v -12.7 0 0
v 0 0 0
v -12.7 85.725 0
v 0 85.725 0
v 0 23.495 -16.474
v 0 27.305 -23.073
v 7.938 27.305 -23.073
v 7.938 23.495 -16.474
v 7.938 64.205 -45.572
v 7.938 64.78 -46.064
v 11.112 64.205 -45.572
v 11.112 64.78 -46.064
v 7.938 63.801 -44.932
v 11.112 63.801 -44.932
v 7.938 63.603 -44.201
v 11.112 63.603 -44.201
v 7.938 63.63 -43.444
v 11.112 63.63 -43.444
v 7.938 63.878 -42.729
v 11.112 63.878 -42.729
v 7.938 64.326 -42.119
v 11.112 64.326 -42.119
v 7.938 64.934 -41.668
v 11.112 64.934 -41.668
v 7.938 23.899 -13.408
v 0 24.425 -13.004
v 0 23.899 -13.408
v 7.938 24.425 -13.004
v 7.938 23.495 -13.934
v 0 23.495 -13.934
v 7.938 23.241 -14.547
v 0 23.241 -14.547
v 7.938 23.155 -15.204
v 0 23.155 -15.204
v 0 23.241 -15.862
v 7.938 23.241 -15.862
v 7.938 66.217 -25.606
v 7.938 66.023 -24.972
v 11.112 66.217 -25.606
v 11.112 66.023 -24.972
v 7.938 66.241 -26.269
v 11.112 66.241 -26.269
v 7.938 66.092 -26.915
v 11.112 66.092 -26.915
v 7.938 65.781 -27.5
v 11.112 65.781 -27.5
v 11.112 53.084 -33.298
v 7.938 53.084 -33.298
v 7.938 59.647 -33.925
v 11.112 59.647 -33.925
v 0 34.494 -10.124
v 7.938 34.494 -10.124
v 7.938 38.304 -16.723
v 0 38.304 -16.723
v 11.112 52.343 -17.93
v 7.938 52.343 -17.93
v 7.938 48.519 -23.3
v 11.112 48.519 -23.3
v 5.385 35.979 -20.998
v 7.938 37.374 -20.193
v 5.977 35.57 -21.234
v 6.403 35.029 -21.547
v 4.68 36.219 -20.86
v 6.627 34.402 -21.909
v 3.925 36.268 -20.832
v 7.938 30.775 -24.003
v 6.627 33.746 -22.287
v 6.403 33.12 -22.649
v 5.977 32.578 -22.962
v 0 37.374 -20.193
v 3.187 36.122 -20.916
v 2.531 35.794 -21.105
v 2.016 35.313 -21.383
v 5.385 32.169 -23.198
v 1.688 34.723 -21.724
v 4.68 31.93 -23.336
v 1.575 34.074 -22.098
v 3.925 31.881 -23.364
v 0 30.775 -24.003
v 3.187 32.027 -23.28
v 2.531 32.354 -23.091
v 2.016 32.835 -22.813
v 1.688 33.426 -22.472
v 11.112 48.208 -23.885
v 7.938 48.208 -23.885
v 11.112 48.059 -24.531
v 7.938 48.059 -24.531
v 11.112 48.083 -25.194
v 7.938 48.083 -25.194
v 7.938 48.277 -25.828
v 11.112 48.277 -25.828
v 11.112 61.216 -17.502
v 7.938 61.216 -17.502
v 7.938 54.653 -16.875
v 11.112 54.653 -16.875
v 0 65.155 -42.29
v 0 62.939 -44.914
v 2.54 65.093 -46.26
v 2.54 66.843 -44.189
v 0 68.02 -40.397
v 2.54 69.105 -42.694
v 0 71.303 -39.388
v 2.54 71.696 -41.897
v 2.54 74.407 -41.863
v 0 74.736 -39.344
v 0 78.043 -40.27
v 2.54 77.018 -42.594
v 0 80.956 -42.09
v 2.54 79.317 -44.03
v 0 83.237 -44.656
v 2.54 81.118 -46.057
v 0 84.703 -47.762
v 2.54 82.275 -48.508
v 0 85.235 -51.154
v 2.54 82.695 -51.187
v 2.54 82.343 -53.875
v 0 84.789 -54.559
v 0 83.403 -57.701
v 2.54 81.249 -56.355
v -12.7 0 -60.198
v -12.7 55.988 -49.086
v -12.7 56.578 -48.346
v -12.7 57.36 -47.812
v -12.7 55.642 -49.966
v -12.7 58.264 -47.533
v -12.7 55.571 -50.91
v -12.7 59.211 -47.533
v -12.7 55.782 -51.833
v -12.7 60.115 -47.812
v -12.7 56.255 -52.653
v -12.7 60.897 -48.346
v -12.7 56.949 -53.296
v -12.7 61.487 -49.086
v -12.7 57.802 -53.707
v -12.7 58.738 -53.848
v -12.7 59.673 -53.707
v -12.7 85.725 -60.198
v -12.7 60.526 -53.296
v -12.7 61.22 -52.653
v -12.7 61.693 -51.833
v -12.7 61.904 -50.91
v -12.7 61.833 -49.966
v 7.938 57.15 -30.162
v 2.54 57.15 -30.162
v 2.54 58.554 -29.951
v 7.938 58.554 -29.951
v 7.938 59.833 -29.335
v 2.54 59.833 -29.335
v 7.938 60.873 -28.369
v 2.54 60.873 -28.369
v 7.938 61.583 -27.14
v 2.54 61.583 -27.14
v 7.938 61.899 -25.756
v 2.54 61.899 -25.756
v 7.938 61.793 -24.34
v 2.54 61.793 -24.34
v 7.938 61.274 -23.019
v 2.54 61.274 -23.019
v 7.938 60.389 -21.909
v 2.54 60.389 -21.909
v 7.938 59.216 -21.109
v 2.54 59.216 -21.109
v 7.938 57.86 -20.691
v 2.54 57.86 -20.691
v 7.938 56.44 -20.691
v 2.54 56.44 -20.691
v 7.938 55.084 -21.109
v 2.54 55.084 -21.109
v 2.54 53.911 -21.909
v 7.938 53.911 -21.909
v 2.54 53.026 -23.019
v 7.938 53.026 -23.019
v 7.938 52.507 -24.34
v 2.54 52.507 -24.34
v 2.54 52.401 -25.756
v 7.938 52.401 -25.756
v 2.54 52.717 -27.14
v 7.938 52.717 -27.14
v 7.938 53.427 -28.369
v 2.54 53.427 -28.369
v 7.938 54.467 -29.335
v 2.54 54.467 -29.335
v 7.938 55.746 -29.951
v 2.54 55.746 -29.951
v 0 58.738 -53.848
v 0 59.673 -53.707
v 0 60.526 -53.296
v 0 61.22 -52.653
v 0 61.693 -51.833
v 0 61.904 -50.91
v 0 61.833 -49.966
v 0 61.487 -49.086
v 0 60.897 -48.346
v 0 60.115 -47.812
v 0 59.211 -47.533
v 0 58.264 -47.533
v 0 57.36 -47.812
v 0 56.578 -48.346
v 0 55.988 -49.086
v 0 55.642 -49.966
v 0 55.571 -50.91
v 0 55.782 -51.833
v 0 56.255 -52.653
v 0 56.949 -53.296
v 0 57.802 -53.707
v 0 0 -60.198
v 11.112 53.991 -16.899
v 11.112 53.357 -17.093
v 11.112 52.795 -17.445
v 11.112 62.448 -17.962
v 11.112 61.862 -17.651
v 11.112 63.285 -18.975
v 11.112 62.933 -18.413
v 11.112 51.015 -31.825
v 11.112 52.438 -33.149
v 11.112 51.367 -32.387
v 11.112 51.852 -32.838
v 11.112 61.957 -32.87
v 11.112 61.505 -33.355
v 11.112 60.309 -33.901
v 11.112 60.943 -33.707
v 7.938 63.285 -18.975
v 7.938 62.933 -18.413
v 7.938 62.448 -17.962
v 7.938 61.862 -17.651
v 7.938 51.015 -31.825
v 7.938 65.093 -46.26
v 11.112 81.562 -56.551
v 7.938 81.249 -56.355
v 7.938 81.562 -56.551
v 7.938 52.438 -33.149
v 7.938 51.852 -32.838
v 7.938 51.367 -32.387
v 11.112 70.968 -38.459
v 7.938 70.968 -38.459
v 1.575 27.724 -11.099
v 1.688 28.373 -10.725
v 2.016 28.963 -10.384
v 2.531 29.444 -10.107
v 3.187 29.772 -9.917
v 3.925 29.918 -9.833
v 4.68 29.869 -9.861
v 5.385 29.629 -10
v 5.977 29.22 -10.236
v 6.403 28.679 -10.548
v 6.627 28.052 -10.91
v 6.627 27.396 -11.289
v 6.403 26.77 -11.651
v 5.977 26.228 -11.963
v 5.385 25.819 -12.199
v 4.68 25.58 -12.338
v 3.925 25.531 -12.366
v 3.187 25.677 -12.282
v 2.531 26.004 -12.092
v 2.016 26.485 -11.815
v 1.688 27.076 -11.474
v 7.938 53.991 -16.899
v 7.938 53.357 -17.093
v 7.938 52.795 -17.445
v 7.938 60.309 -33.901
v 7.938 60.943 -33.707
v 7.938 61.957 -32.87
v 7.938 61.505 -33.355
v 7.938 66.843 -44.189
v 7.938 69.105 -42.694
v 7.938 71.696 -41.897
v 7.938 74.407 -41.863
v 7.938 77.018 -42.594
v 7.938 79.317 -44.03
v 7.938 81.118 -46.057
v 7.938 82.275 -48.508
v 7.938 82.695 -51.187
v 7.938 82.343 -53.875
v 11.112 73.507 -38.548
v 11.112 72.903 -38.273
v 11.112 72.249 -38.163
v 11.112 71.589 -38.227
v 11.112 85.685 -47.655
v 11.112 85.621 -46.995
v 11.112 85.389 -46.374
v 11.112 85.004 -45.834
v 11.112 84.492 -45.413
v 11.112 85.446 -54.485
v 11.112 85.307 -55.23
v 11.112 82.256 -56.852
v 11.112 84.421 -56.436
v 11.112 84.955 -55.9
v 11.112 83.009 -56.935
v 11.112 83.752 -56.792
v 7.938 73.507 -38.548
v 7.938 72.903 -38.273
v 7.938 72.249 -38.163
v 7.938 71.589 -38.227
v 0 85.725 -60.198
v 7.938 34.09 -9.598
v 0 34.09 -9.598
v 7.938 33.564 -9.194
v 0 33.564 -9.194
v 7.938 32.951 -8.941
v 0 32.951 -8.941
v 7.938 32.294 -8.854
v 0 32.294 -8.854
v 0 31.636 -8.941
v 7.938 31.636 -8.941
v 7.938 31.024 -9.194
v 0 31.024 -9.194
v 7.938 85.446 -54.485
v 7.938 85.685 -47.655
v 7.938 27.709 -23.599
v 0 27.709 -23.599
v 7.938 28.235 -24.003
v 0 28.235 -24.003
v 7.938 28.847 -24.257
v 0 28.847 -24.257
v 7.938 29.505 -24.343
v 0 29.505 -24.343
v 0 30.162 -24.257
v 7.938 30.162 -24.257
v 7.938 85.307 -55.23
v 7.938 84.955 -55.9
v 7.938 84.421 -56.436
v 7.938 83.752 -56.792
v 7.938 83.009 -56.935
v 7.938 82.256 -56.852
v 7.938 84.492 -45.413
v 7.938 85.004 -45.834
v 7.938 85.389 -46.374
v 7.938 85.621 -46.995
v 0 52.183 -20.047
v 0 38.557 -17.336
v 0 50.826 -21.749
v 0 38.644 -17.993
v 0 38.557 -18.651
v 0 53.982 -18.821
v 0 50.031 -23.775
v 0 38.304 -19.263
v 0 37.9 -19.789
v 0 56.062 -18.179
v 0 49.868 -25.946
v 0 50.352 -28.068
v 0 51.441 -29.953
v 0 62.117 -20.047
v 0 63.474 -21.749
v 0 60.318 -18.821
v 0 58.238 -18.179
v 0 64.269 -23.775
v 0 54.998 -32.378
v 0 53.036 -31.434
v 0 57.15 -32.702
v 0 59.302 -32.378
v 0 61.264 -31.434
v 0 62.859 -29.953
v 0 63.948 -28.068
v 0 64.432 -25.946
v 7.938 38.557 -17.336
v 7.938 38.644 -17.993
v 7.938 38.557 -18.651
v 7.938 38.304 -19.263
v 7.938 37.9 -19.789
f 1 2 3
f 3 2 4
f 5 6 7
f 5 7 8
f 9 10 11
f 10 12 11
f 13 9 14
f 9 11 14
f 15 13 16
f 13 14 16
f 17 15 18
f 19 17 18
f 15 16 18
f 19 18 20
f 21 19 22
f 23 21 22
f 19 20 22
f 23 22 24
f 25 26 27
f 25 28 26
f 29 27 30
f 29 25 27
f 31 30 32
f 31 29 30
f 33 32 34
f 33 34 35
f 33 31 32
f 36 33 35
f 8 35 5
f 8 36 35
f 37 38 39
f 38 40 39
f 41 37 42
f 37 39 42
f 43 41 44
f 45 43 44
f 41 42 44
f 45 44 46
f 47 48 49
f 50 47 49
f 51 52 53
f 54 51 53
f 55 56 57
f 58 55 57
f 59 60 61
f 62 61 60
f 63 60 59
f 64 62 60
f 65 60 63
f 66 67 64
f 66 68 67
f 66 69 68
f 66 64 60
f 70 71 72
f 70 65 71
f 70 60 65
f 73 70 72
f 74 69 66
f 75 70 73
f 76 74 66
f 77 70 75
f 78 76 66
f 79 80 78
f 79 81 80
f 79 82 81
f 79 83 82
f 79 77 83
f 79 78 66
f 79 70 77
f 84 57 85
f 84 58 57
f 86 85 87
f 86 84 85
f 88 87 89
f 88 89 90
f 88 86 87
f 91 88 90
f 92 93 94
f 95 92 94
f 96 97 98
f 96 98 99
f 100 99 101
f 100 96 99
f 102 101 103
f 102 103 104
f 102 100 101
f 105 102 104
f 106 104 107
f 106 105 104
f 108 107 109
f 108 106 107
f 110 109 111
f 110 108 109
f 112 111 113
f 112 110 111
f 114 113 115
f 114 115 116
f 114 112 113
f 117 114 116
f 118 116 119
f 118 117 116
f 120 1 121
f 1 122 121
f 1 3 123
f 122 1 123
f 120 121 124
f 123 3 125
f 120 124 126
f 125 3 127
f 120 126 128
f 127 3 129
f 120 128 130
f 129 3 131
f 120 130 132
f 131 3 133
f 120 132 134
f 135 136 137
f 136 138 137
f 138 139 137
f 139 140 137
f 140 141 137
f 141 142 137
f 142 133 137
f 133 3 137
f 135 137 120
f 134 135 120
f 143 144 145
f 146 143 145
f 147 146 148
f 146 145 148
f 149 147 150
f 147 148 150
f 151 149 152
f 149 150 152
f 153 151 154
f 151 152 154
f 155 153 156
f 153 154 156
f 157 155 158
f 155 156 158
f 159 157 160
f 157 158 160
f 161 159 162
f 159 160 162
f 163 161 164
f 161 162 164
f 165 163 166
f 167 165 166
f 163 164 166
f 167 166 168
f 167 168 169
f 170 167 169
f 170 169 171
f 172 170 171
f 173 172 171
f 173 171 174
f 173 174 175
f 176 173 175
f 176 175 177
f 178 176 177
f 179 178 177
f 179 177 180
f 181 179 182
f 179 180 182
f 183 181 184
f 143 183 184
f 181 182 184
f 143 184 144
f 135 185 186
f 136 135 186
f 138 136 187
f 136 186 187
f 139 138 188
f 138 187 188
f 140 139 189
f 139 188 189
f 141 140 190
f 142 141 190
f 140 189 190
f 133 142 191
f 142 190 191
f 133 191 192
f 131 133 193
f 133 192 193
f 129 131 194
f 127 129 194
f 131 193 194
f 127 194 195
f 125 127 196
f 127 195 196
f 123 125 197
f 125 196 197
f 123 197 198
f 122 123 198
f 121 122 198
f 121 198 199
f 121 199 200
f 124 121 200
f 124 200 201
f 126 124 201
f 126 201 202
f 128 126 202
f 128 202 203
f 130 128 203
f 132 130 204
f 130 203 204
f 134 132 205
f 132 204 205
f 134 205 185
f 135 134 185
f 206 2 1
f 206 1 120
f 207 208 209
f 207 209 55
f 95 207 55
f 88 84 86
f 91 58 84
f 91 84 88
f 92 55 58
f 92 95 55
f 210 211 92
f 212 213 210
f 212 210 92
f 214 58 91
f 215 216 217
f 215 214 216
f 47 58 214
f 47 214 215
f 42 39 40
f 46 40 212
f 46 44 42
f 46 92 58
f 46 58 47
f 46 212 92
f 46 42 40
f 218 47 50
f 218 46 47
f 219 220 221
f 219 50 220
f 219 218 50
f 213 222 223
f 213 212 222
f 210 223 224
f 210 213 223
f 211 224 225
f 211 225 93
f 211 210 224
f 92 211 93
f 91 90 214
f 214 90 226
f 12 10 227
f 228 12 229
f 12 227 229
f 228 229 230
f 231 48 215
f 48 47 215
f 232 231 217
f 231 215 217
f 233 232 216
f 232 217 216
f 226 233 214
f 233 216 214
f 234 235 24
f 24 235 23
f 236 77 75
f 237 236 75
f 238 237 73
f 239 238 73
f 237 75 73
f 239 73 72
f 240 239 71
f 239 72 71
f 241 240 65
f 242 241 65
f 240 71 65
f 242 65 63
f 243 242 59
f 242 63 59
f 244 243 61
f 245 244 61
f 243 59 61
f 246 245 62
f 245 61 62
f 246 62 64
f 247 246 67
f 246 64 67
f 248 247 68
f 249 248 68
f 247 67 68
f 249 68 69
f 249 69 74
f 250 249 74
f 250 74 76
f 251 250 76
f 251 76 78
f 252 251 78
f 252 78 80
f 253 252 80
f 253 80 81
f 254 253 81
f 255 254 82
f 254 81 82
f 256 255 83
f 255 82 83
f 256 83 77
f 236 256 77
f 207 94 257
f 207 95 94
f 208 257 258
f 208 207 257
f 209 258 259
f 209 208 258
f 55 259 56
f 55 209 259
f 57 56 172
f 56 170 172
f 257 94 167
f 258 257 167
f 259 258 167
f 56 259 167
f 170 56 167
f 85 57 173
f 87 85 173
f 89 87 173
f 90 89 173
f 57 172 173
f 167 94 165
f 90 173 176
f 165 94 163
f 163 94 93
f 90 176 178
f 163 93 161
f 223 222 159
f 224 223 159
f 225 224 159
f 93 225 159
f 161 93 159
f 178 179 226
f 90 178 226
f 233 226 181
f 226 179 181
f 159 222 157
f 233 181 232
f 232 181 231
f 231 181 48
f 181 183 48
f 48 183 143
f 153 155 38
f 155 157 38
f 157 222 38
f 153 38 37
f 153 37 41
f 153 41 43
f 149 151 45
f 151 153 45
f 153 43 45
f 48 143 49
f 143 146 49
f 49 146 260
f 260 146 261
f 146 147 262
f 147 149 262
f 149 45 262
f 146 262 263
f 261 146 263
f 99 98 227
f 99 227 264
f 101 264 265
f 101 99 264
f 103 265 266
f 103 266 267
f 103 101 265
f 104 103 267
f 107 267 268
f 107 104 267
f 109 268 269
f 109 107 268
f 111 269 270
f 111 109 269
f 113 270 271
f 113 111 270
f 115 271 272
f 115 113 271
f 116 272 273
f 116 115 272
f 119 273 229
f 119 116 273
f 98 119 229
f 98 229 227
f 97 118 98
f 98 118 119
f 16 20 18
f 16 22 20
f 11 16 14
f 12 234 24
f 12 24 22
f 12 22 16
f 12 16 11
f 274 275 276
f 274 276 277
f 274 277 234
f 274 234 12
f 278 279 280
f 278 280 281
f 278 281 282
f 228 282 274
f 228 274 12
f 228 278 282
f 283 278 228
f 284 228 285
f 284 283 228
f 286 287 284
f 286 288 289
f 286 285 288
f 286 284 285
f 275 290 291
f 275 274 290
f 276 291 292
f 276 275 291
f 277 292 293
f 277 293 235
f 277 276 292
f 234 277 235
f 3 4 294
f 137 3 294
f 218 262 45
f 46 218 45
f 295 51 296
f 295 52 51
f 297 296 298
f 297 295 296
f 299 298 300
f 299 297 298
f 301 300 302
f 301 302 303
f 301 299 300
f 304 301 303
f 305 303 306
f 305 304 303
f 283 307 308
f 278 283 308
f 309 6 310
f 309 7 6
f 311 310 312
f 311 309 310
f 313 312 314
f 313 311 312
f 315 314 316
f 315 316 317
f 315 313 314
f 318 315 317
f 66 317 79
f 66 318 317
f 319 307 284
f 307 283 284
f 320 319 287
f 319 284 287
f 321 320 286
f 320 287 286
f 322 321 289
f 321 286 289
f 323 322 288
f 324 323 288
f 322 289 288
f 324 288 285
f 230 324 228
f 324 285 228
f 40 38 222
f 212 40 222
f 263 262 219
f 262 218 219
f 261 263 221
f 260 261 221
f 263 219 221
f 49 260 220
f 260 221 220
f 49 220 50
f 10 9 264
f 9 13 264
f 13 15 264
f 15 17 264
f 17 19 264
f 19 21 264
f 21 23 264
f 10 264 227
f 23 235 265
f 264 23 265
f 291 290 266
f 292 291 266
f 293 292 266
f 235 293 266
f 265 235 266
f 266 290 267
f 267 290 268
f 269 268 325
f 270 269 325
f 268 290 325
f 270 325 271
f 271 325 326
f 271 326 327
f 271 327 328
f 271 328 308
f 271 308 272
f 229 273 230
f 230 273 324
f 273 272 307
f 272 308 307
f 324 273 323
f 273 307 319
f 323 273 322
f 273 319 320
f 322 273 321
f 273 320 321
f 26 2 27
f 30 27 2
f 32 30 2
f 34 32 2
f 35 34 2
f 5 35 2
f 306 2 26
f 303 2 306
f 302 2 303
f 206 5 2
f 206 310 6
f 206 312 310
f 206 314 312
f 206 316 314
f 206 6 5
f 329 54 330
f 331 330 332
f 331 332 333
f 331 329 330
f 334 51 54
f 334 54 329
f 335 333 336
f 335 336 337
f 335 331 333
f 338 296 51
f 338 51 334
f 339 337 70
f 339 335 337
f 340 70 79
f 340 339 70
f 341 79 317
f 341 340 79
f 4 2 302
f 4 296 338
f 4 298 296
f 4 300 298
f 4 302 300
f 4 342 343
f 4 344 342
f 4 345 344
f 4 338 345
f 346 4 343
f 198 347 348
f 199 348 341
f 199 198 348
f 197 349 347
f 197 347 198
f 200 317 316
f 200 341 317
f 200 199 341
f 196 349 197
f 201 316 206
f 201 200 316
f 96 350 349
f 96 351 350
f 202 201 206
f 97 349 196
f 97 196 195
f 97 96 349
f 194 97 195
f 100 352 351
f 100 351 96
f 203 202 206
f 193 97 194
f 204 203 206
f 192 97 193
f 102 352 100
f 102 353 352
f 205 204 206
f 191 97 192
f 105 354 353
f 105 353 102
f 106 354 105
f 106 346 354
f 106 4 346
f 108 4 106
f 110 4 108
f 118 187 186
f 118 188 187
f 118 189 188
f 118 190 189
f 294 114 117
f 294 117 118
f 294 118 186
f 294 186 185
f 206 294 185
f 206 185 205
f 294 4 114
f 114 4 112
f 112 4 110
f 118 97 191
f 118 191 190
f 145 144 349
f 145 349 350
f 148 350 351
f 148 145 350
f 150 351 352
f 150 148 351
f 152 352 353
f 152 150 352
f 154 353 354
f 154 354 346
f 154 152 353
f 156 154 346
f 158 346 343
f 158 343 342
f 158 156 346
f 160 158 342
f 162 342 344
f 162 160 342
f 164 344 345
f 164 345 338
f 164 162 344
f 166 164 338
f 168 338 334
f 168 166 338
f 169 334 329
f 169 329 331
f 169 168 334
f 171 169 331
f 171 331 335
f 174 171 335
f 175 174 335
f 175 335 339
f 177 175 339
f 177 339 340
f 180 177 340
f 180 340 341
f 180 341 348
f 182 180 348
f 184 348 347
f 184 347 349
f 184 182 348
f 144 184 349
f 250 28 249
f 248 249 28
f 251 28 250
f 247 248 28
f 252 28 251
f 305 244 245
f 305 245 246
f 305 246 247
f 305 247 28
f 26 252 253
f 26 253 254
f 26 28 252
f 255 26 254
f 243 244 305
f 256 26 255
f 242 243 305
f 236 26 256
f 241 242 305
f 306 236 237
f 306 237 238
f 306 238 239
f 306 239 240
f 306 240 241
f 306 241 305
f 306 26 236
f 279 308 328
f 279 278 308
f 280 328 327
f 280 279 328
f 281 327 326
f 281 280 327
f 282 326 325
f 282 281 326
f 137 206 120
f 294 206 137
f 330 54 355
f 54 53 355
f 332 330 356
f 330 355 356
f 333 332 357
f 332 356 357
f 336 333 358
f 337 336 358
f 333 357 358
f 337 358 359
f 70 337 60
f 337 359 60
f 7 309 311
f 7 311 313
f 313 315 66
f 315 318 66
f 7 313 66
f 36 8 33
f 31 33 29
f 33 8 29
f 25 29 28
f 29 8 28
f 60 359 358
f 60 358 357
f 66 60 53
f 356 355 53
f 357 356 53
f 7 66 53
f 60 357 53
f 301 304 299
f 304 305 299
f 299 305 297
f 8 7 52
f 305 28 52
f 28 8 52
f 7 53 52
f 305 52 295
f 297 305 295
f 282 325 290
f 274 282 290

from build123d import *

# Parameters (mm, degrees)
SKETCH1_W           = 60.198
SKETCH1_H           = 85.725
SKETCH1_R           = 3.175
BOSS_EXTRUDE1_DEPTH = 12.7
SKETCH3_R           = 4.7625
BOSS_EXTRUDE2_DEPTH = 7.9375
BOSS_EXTRUDE3_DEPTH = 3.175
BOSS_EXTRUDE4_DEPTH = 3.175
FILLET1_R           = 2.54
CHAMFER1_SIZE       = 2.54
SKETCH15_R          = 2.54
CUT_EXTRUDE1_DEPTH  = 12.7


with BuildPart() as part:
    # Sketch1 → Boss-Extrude1 (new body)
    with BuildSketch(Plane(origin=(0, 0, 0), x_dir=(0, 0, -1), z_dir=(1, 0, 0))):
        with Locations((30.099, 42.8625)):
            Rectangle(SKETCH1_W, SKETCH1_H)
        with Locations((50.673, 58.7375)):
            Circle(SKETCH1_R, mode=Mode.SUBTRACT)
    extrude(amount=-BOSS_EXTRUDE1_DEPTH)

    # Sketch3 → Boss-Extrude2 (add)
    with BuildSketch(Plane(origin=(0, 0, 0), x_dir=(0, 0, -1), z_dir=(1, 0, 0))):
        with Locations((25.4, 57.15)):
            Circle(SKETCH3_R)
        Polygon((18.923, 39.573522628), (25.273, 28.575), (14.274477372, 22.225), (7.924477372, 33.223522628), align=None)
        with BuildLine():
            Line((56.355023328, 81.24857189), (46.259909872, 65.09335031))
            ThreePointArc((46.259909872, 65.09335031), (43.22985581, 78.218517828), (56.355023328, 81.24857189))
        make_face()
    extrude(amount=BOSS_EXTRUDE2_DEPTH)

    # Sketch10 → Boss-Extrude3 (add)
    with BuildSketch(Plane(origin=(7.9375, 0, 0), x_dir=(0, 0, -1), z_dir=(1, 0, 0))):
        Polygon((26.305931595, 66.631820128), (17.641468693, 62.67546984), (16.735537097, 53.193649712), (24.494068405, 47.668179872), (33.158531307, 51.62453016), (34.064462903, 61.106350288), align=None)
    extrude(amount=BOSS_EXTRUDE3_DEPTH)

    # Sketch14 → Boss-Extrude4 (add)
    with BuildSketch(Plane(origin=(7.9375, 0, 0), x_dir=(0, 0, -1), z_dir=(1, 0, 0))):
        Polygon((51.3074666, 73.1709611), (58.881956407, 85.29242578), (46.18969706, 85.735768391), (37.770793083, 72.262986752), (43.732976793, 61.04949642), align=None)
    extrude(amount=BOSS_EXTRUDE4_DEPTH)

    # Fillet1
    fillet1_edges = [part.edges().sort_by_distance(p)[0] for p in [
        (3.96875, 39.573522628, -18.923),
        (3.96875, 33.223522628, -7.924477372),
        (3.96875, 22.225, -14.274477372),
        (3.96875, 28.575, -25.273),
        (9.525, 61.106350288, -34.064462903),
        (9.525, 66.631820128, -26.305931595),
        (9.525, 62.67546984, -17.641468693),
        (9.525, 53.193649712, -16.735537097),
        (9.525, 47.668179872, -24.494068405),
        (9.525, 51.62453016, -33.158531307),
        (9.525, 61.04949642, -43.732976793),
        (9.525, 85.29242578, -58.881956407),
        (9.525, 85.735768391, -46.18969706),
        (9.525, 72.262986752, -37.770793083),
    ]]
    fillet(fillet1_edges, radius=FILLET1_R)

    # Chamfer1
    chamfer1_edges = [part.edges().sort_by_distance(p)[0] for p in [
        (0, 57.15, -20.6375),
        (0, 78.218517828, -43.22985581),
    ]]
    chamfer(chamfer1_edges, length=CHAMFER1_SIZE)

    # Sketch15 → Cut-Extrude1 (cut)
    with BuildSketch(Plane(origin=(0, 18.087280015, -31.328087957), x_dir=(-1, 0, 0), z_dir=(0, 0.5, -0.866025404))):
        with Locations((-4.114917268, 18.460175913)):
            Circle(SKETCH15_R)
    extrude(amount=-CUT_EXTRUDE1_DEPTH, mode=Mode.SUBTRACT)


solid = part.part
